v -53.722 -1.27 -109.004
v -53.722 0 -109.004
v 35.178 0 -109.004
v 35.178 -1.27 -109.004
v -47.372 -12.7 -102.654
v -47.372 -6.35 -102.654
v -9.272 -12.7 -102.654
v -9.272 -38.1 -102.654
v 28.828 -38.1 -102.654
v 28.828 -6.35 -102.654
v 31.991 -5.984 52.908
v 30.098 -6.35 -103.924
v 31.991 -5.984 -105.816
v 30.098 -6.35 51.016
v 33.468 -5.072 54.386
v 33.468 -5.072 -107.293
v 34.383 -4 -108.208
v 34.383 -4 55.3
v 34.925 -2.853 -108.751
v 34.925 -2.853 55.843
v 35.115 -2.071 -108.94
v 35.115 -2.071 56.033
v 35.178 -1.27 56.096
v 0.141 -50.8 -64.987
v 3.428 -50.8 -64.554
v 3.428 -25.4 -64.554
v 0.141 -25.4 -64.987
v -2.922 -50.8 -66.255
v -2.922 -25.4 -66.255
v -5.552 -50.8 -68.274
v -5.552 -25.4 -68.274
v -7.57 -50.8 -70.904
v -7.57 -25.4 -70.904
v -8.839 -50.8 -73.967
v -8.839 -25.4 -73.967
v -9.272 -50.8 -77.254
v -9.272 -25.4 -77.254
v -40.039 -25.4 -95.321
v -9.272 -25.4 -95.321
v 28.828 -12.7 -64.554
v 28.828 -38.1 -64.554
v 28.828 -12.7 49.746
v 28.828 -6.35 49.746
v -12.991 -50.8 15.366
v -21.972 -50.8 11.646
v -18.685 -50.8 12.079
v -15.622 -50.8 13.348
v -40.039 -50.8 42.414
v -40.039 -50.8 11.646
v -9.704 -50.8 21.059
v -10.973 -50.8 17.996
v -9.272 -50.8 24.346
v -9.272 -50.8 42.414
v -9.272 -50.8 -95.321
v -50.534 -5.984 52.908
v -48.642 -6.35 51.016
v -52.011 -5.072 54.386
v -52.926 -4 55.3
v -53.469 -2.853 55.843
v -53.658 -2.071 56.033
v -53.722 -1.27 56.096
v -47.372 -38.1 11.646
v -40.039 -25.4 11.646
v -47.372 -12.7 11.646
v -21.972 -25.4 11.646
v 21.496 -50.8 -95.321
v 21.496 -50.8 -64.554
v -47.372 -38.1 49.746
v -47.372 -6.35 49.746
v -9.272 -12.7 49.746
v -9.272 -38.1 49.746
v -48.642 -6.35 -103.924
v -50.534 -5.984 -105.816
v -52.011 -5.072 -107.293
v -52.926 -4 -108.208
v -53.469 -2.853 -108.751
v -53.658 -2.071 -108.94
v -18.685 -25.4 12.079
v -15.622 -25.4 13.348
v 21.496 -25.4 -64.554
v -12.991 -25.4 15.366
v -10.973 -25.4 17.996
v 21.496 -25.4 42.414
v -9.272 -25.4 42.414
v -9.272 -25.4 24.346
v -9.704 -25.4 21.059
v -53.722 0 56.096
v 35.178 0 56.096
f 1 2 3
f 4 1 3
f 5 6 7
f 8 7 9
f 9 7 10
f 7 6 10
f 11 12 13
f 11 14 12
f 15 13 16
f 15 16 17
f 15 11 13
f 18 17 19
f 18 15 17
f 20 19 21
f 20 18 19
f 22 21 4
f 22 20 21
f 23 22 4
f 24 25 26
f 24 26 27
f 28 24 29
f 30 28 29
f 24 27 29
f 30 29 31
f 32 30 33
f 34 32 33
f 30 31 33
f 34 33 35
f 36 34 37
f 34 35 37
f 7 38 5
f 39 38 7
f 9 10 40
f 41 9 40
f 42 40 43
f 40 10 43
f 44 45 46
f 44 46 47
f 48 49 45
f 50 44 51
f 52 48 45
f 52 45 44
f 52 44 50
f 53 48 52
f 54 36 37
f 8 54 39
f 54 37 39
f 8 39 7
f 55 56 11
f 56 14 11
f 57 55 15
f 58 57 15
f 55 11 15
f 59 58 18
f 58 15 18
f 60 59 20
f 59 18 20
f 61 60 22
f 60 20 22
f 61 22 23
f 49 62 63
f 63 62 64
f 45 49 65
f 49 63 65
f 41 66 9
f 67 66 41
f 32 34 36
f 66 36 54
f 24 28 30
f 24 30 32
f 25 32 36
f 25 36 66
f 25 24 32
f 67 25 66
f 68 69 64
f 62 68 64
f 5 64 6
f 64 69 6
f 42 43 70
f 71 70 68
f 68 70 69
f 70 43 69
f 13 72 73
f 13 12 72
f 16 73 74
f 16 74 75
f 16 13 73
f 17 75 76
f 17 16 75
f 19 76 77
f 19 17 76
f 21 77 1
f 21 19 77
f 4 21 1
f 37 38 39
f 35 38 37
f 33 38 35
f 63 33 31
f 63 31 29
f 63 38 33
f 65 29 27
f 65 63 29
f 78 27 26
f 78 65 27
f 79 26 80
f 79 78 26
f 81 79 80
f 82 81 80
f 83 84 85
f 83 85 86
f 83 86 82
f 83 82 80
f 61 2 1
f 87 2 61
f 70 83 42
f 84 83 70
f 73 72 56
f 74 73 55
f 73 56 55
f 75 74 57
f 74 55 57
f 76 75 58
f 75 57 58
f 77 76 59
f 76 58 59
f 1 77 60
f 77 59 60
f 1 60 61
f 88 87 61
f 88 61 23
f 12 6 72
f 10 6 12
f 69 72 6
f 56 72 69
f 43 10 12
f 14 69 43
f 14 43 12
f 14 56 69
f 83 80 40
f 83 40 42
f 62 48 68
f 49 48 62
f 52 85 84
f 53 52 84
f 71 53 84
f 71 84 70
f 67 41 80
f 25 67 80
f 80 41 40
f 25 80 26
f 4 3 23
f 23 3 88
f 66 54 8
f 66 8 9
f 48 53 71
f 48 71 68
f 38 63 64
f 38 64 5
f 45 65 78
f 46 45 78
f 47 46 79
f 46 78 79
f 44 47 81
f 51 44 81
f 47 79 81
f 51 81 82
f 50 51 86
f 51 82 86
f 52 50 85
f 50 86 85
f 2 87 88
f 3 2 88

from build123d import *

# Parameters (mm, degrees)
F0_W     = 88.8999989152
F0_H     = 165.0999989152
F1_DEPTH = 6.35
F2_DEPTH = 25.4
F3_DEPTH = 50.8
F4_R     = 5.08
F5_SIZE2 = 7.3323484187
F5_SIZE  = 12.7


with BuildPart() as f1:
    # F0 (on Front) → F1 (new body)
    with BuildSketch(Plane.XZ):
        with Locations((-9.271614182, -26.4538442612)):
            Rectangle(F0_W, F0_H)
        Polygon((-47.371614182, 11.6461557388), (-47.371614182, 49.7461557388), (-9.271614182, 49.7461557388), (28.828385818, 49.7461557388), (28.828385818, -64.5538442612), (28.828385818, -102.6538442612), (-9.271614182, -102.6538442612), (-47.371614182, -102.6538442612), align=None, mode=Mode.SUBTRACT)
    extrude(amount=F1_DEPTH)

    # F0 (on Front) → F2 (join)
    with BuildSketch(Plane.XZ):
        with BuildLine():
            Line((-21.971614182, 11.6461557388), (-47.371614182, 11.6461557388))
            Line((-47.371614182, 11.6461557388), (-47.371614182, -102.6538442612))
            Line((-47.371614182, -102.6538442612), (-9.271614182, -102.6538442612))
            Line((-9.271614182, -102.6538442612), (-9.271614182, -77.2538442612))
            ThreePointArc((-9.271614182, -77.2538442612), (-5.5518703031, -68.2735881401), (3.428385818, -64.5538442612))
            Line((3.428385818, -64.5538442612), (28.828385818, -64.5538442612))
            Line((28.828385818, -64.5538442612), (28.828385818, 49.7461557388))
            Line((28.828385818, 49.7461557388), (-9.271614182, 49.7461557388))
            Line((-9.271614182, 49.7461557388), (-9.271614182, 24.3461557388))
            ThreePointArc((-9.271614182, 24.3461557388), (-12.9913580609, 15.3658996178), (-21.971614182, 11.6461557388))
        make_face()
    extrude(amount=F2_DEPTH)

    # F0 (on Front) → F3 (join)
    with BuildSketch(Plane.XZ):
        with BuildLine():
            Line((-9.271614182, 49.7461557388), (-47.371614182, 49.7461557388))
            Line((-47.371614182, 49.7461557388), (-47.371614182, 11.6461557388))
            Line((-47.371614182, 11.6461557388), (-21.971614182, 11.6461557388))
            ThreePointArc((-21.971614182, 11.6461557388), (-12.9913580609, 15.3658996178), (-9.271614182, 24.3461557388))
            Line((-9.271614182, 24.3461557388), (-9.271614182, 49.7461557388))
        make_face()
        with BuildLine():
            Line((-9.271614182, -77.2538442612), (-9.271614182, -102.6538442612))
            Line((-9.271614182, -102.6538442612), (28.828385818, -102.6538442612))
            Line((28.828385818, -102.6538442612), (28.828385818, -64.5538442612))
            Line((28.828385818, -64.5538442612), (3.428385818, -64.5538442612))
            ThreePointArc((3.428385818, -64.5538442612), (-5.5518703031, -68.2735881401), (-9.271614182, -77.2538442612))
        make_face()
    extrude(amount=F3_DEPTH)

    # F4
    f4_edges = [f1.edges().sort_by_distance(p)[0] for p in [
        (35.178385, -6.35, -26.453844),
        (-9.271614, -6.35, -109.003844),
        (-53.721614, -6.35, -26.453844),
        (-9.271614, -6.35, 56.096155),
    ]]
    fillet(f4_edges, radius=F4_R)

    # F5
    f5_edges = [f1.edges().sort_by_distance(p)[0] for p in [
        (-47.371614, -50.8, 30.696156),
        (-28.321614, -50.8, 49.746156),
        (9.778386, -50.8, -102.653844),
        (28.828386, -50.8, -83.603844),
        (28.828386, -25.4, -7.403844),
        (-47.371614, -25.4, -45.503844),
        (-28.321614, -25.4, -102.653844),
        (9.778386, -25.4, 49.746156),
    ]]
    chamfer(f5_edges, length=F5_SIZE, length2=F5_SIZE2)


solid = f1.part
